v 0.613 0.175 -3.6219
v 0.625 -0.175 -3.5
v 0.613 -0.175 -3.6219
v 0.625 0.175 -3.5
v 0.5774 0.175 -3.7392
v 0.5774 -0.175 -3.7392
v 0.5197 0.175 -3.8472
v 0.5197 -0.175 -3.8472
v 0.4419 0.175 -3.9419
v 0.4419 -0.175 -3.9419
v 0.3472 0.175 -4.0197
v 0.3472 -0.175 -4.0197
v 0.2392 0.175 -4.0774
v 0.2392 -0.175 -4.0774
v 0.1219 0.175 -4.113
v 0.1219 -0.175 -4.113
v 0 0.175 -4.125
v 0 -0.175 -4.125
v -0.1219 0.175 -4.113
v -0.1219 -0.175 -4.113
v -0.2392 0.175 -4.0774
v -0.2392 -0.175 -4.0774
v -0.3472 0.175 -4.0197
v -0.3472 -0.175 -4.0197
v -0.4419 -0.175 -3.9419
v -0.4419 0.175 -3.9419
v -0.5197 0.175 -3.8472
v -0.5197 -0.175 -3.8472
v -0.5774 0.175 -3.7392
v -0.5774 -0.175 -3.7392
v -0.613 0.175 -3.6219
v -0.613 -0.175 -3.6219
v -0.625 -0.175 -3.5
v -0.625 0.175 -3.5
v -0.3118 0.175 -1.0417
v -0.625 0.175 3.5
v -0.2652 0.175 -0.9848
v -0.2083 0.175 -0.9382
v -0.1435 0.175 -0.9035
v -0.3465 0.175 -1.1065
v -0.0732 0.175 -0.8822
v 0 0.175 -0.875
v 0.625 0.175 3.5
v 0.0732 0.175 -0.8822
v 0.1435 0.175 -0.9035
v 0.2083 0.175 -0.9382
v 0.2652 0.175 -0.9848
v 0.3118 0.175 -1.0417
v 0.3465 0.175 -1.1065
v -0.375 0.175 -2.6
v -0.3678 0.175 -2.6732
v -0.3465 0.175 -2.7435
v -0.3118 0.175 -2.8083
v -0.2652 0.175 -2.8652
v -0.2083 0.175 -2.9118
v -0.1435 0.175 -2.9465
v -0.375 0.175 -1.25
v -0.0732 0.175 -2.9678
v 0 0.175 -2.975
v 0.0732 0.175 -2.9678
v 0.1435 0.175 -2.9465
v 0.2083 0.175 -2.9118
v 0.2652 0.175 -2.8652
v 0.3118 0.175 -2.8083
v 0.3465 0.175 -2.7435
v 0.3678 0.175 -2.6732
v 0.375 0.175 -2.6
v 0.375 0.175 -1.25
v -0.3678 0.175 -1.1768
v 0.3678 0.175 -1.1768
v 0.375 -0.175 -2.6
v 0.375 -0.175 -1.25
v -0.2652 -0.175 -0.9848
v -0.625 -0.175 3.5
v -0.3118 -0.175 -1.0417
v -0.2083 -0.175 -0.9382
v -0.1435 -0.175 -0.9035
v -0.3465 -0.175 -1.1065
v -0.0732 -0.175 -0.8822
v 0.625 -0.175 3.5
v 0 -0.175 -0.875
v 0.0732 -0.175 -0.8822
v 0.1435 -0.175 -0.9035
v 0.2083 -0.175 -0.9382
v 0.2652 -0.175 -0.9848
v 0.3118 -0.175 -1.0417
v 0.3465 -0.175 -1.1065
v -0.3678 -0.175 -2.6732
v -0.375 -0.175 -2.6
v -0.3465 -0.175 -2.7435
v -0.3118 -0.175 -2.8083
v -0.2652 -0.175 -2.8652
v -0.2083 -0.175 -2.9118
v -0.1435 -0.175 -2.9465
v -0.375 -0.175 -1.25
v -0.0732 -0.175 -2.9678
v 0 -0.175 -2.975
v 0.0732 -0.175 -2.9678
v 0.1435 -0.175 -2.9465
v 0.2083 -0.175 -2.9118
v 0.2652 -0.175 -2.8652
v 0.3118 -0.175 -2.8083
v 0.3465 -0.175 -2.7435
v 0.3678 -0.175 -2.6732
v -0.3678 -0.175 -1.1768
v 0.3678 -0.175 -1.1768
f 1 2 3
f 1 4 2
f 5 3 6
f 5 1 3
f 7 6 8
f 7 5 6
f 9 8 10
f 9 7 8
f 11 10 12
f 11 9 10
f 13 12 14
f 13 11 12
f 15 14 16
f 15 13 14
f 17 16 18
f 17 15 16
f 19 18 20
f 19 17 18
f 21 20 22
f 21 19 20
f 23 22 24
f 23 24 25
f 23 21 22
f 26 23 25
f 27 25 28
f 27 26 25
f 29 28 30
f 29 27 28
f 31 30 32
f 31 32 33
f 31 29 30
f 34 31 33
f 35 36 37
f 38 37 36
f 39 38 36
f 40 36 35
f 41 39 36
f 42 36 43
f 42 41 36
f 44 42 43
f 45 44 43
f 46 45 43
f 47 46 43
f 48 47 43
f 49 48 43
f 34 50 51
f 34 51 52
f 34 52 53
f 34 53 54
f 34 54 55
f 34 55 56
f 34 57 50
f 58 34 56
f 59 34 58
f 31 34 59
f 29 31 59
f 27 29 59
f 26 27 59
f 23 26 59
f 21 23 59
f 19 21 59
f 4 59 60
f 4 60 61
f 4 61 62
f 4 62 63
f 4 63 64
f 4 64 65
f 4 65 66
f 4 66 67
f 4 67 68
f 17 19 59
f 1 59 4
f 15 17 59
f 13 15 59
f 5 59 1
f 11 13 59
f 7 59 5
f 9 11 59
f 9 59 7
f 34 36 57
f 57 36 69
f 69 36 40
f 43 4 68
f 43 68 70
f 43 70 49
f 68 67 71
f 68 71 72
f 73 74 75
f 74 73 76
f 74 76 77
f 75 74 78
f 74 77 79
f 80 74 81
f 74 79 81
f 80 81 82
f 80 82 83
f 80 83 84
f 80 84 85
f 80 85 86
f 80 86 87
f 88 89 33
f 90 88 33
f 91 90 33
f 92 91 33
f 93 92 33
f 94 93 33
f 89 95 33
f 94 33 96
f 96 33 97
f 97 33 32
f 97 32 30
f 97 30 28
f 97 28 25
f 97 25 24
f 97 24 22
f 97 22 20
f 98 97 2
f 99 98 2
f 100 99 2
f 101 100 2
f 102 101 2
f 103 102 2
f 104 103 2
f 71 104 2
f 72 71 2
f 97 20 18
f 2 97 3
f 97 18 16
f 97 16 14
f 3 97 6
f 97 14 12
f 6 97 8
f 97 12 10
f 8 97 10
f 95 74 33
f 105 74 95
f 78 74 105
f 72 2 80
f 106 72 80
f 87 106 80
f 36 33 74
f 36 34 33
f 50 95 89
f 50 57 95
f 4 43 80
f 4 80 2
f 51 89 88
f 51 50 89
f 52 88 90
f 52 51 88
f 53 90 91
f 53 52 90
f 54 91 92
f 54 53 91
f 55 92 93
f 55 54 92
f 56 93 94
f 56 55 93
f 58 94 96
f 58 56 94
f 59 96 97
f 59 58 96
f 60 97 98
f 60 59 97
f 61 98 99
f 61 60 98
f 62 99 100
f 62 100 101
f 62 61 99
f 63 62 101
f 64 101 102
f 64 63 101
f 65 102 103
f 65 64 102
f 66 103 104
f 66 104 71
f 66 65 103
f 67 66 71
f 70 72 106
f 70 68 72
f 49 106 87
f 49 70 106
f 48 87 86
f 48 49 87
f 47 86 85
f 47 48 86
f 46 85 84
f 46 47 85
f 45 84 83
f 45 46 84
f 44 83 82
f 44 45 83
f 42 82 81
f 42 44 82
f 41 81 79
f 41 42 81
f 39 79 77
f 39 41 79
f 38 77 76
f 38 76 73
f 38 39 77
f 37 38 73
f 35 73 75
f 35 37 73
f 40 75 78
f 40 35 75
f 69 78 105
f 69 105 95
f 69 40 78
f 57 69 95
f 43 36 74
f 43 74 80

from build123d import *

# Parameters (mm, degrees)
BOSS_EXTRUDE2_DEPTH = 0.175


with BuildPart() as part:
    # Sketch1 → Boss-Extrude2 (new, symmetric)
    with BuildSketch(Plane(origin=(0, 0, 0), x_dir=(1, 0, 0), z_dir=(0, 1, 0))):
        with BuildLine():
            Line((-0.625, 3.5), (-0.625, -3.5))
            Line((-0.625, -3.5), (0.625, -3.5))
            Line((0.625, -3.5), (0.625, 3.5))
            ThreePointArc((0.625, 3.5), (0, 4.125), (-0.625, 3.5))
        make_face()
        with BuildLine():
            Line((0.375, 2.6), (0.375, 1.25))
            ThreePointArc((0.375, 1.25), (0, 0.875), (-0.375, 1.25))
            Line((-0.375, 1.25), (-0.375, 2.6))
            ThreePointArc((-0.375, 2.6), (0, 2.975), (0.375, 2.6))
        make_face(mode=Mode.SUBTRACT)
    extrude(amount=BOSS_EXTRUDE2_DEPTH, both=True)


solid = part.part
